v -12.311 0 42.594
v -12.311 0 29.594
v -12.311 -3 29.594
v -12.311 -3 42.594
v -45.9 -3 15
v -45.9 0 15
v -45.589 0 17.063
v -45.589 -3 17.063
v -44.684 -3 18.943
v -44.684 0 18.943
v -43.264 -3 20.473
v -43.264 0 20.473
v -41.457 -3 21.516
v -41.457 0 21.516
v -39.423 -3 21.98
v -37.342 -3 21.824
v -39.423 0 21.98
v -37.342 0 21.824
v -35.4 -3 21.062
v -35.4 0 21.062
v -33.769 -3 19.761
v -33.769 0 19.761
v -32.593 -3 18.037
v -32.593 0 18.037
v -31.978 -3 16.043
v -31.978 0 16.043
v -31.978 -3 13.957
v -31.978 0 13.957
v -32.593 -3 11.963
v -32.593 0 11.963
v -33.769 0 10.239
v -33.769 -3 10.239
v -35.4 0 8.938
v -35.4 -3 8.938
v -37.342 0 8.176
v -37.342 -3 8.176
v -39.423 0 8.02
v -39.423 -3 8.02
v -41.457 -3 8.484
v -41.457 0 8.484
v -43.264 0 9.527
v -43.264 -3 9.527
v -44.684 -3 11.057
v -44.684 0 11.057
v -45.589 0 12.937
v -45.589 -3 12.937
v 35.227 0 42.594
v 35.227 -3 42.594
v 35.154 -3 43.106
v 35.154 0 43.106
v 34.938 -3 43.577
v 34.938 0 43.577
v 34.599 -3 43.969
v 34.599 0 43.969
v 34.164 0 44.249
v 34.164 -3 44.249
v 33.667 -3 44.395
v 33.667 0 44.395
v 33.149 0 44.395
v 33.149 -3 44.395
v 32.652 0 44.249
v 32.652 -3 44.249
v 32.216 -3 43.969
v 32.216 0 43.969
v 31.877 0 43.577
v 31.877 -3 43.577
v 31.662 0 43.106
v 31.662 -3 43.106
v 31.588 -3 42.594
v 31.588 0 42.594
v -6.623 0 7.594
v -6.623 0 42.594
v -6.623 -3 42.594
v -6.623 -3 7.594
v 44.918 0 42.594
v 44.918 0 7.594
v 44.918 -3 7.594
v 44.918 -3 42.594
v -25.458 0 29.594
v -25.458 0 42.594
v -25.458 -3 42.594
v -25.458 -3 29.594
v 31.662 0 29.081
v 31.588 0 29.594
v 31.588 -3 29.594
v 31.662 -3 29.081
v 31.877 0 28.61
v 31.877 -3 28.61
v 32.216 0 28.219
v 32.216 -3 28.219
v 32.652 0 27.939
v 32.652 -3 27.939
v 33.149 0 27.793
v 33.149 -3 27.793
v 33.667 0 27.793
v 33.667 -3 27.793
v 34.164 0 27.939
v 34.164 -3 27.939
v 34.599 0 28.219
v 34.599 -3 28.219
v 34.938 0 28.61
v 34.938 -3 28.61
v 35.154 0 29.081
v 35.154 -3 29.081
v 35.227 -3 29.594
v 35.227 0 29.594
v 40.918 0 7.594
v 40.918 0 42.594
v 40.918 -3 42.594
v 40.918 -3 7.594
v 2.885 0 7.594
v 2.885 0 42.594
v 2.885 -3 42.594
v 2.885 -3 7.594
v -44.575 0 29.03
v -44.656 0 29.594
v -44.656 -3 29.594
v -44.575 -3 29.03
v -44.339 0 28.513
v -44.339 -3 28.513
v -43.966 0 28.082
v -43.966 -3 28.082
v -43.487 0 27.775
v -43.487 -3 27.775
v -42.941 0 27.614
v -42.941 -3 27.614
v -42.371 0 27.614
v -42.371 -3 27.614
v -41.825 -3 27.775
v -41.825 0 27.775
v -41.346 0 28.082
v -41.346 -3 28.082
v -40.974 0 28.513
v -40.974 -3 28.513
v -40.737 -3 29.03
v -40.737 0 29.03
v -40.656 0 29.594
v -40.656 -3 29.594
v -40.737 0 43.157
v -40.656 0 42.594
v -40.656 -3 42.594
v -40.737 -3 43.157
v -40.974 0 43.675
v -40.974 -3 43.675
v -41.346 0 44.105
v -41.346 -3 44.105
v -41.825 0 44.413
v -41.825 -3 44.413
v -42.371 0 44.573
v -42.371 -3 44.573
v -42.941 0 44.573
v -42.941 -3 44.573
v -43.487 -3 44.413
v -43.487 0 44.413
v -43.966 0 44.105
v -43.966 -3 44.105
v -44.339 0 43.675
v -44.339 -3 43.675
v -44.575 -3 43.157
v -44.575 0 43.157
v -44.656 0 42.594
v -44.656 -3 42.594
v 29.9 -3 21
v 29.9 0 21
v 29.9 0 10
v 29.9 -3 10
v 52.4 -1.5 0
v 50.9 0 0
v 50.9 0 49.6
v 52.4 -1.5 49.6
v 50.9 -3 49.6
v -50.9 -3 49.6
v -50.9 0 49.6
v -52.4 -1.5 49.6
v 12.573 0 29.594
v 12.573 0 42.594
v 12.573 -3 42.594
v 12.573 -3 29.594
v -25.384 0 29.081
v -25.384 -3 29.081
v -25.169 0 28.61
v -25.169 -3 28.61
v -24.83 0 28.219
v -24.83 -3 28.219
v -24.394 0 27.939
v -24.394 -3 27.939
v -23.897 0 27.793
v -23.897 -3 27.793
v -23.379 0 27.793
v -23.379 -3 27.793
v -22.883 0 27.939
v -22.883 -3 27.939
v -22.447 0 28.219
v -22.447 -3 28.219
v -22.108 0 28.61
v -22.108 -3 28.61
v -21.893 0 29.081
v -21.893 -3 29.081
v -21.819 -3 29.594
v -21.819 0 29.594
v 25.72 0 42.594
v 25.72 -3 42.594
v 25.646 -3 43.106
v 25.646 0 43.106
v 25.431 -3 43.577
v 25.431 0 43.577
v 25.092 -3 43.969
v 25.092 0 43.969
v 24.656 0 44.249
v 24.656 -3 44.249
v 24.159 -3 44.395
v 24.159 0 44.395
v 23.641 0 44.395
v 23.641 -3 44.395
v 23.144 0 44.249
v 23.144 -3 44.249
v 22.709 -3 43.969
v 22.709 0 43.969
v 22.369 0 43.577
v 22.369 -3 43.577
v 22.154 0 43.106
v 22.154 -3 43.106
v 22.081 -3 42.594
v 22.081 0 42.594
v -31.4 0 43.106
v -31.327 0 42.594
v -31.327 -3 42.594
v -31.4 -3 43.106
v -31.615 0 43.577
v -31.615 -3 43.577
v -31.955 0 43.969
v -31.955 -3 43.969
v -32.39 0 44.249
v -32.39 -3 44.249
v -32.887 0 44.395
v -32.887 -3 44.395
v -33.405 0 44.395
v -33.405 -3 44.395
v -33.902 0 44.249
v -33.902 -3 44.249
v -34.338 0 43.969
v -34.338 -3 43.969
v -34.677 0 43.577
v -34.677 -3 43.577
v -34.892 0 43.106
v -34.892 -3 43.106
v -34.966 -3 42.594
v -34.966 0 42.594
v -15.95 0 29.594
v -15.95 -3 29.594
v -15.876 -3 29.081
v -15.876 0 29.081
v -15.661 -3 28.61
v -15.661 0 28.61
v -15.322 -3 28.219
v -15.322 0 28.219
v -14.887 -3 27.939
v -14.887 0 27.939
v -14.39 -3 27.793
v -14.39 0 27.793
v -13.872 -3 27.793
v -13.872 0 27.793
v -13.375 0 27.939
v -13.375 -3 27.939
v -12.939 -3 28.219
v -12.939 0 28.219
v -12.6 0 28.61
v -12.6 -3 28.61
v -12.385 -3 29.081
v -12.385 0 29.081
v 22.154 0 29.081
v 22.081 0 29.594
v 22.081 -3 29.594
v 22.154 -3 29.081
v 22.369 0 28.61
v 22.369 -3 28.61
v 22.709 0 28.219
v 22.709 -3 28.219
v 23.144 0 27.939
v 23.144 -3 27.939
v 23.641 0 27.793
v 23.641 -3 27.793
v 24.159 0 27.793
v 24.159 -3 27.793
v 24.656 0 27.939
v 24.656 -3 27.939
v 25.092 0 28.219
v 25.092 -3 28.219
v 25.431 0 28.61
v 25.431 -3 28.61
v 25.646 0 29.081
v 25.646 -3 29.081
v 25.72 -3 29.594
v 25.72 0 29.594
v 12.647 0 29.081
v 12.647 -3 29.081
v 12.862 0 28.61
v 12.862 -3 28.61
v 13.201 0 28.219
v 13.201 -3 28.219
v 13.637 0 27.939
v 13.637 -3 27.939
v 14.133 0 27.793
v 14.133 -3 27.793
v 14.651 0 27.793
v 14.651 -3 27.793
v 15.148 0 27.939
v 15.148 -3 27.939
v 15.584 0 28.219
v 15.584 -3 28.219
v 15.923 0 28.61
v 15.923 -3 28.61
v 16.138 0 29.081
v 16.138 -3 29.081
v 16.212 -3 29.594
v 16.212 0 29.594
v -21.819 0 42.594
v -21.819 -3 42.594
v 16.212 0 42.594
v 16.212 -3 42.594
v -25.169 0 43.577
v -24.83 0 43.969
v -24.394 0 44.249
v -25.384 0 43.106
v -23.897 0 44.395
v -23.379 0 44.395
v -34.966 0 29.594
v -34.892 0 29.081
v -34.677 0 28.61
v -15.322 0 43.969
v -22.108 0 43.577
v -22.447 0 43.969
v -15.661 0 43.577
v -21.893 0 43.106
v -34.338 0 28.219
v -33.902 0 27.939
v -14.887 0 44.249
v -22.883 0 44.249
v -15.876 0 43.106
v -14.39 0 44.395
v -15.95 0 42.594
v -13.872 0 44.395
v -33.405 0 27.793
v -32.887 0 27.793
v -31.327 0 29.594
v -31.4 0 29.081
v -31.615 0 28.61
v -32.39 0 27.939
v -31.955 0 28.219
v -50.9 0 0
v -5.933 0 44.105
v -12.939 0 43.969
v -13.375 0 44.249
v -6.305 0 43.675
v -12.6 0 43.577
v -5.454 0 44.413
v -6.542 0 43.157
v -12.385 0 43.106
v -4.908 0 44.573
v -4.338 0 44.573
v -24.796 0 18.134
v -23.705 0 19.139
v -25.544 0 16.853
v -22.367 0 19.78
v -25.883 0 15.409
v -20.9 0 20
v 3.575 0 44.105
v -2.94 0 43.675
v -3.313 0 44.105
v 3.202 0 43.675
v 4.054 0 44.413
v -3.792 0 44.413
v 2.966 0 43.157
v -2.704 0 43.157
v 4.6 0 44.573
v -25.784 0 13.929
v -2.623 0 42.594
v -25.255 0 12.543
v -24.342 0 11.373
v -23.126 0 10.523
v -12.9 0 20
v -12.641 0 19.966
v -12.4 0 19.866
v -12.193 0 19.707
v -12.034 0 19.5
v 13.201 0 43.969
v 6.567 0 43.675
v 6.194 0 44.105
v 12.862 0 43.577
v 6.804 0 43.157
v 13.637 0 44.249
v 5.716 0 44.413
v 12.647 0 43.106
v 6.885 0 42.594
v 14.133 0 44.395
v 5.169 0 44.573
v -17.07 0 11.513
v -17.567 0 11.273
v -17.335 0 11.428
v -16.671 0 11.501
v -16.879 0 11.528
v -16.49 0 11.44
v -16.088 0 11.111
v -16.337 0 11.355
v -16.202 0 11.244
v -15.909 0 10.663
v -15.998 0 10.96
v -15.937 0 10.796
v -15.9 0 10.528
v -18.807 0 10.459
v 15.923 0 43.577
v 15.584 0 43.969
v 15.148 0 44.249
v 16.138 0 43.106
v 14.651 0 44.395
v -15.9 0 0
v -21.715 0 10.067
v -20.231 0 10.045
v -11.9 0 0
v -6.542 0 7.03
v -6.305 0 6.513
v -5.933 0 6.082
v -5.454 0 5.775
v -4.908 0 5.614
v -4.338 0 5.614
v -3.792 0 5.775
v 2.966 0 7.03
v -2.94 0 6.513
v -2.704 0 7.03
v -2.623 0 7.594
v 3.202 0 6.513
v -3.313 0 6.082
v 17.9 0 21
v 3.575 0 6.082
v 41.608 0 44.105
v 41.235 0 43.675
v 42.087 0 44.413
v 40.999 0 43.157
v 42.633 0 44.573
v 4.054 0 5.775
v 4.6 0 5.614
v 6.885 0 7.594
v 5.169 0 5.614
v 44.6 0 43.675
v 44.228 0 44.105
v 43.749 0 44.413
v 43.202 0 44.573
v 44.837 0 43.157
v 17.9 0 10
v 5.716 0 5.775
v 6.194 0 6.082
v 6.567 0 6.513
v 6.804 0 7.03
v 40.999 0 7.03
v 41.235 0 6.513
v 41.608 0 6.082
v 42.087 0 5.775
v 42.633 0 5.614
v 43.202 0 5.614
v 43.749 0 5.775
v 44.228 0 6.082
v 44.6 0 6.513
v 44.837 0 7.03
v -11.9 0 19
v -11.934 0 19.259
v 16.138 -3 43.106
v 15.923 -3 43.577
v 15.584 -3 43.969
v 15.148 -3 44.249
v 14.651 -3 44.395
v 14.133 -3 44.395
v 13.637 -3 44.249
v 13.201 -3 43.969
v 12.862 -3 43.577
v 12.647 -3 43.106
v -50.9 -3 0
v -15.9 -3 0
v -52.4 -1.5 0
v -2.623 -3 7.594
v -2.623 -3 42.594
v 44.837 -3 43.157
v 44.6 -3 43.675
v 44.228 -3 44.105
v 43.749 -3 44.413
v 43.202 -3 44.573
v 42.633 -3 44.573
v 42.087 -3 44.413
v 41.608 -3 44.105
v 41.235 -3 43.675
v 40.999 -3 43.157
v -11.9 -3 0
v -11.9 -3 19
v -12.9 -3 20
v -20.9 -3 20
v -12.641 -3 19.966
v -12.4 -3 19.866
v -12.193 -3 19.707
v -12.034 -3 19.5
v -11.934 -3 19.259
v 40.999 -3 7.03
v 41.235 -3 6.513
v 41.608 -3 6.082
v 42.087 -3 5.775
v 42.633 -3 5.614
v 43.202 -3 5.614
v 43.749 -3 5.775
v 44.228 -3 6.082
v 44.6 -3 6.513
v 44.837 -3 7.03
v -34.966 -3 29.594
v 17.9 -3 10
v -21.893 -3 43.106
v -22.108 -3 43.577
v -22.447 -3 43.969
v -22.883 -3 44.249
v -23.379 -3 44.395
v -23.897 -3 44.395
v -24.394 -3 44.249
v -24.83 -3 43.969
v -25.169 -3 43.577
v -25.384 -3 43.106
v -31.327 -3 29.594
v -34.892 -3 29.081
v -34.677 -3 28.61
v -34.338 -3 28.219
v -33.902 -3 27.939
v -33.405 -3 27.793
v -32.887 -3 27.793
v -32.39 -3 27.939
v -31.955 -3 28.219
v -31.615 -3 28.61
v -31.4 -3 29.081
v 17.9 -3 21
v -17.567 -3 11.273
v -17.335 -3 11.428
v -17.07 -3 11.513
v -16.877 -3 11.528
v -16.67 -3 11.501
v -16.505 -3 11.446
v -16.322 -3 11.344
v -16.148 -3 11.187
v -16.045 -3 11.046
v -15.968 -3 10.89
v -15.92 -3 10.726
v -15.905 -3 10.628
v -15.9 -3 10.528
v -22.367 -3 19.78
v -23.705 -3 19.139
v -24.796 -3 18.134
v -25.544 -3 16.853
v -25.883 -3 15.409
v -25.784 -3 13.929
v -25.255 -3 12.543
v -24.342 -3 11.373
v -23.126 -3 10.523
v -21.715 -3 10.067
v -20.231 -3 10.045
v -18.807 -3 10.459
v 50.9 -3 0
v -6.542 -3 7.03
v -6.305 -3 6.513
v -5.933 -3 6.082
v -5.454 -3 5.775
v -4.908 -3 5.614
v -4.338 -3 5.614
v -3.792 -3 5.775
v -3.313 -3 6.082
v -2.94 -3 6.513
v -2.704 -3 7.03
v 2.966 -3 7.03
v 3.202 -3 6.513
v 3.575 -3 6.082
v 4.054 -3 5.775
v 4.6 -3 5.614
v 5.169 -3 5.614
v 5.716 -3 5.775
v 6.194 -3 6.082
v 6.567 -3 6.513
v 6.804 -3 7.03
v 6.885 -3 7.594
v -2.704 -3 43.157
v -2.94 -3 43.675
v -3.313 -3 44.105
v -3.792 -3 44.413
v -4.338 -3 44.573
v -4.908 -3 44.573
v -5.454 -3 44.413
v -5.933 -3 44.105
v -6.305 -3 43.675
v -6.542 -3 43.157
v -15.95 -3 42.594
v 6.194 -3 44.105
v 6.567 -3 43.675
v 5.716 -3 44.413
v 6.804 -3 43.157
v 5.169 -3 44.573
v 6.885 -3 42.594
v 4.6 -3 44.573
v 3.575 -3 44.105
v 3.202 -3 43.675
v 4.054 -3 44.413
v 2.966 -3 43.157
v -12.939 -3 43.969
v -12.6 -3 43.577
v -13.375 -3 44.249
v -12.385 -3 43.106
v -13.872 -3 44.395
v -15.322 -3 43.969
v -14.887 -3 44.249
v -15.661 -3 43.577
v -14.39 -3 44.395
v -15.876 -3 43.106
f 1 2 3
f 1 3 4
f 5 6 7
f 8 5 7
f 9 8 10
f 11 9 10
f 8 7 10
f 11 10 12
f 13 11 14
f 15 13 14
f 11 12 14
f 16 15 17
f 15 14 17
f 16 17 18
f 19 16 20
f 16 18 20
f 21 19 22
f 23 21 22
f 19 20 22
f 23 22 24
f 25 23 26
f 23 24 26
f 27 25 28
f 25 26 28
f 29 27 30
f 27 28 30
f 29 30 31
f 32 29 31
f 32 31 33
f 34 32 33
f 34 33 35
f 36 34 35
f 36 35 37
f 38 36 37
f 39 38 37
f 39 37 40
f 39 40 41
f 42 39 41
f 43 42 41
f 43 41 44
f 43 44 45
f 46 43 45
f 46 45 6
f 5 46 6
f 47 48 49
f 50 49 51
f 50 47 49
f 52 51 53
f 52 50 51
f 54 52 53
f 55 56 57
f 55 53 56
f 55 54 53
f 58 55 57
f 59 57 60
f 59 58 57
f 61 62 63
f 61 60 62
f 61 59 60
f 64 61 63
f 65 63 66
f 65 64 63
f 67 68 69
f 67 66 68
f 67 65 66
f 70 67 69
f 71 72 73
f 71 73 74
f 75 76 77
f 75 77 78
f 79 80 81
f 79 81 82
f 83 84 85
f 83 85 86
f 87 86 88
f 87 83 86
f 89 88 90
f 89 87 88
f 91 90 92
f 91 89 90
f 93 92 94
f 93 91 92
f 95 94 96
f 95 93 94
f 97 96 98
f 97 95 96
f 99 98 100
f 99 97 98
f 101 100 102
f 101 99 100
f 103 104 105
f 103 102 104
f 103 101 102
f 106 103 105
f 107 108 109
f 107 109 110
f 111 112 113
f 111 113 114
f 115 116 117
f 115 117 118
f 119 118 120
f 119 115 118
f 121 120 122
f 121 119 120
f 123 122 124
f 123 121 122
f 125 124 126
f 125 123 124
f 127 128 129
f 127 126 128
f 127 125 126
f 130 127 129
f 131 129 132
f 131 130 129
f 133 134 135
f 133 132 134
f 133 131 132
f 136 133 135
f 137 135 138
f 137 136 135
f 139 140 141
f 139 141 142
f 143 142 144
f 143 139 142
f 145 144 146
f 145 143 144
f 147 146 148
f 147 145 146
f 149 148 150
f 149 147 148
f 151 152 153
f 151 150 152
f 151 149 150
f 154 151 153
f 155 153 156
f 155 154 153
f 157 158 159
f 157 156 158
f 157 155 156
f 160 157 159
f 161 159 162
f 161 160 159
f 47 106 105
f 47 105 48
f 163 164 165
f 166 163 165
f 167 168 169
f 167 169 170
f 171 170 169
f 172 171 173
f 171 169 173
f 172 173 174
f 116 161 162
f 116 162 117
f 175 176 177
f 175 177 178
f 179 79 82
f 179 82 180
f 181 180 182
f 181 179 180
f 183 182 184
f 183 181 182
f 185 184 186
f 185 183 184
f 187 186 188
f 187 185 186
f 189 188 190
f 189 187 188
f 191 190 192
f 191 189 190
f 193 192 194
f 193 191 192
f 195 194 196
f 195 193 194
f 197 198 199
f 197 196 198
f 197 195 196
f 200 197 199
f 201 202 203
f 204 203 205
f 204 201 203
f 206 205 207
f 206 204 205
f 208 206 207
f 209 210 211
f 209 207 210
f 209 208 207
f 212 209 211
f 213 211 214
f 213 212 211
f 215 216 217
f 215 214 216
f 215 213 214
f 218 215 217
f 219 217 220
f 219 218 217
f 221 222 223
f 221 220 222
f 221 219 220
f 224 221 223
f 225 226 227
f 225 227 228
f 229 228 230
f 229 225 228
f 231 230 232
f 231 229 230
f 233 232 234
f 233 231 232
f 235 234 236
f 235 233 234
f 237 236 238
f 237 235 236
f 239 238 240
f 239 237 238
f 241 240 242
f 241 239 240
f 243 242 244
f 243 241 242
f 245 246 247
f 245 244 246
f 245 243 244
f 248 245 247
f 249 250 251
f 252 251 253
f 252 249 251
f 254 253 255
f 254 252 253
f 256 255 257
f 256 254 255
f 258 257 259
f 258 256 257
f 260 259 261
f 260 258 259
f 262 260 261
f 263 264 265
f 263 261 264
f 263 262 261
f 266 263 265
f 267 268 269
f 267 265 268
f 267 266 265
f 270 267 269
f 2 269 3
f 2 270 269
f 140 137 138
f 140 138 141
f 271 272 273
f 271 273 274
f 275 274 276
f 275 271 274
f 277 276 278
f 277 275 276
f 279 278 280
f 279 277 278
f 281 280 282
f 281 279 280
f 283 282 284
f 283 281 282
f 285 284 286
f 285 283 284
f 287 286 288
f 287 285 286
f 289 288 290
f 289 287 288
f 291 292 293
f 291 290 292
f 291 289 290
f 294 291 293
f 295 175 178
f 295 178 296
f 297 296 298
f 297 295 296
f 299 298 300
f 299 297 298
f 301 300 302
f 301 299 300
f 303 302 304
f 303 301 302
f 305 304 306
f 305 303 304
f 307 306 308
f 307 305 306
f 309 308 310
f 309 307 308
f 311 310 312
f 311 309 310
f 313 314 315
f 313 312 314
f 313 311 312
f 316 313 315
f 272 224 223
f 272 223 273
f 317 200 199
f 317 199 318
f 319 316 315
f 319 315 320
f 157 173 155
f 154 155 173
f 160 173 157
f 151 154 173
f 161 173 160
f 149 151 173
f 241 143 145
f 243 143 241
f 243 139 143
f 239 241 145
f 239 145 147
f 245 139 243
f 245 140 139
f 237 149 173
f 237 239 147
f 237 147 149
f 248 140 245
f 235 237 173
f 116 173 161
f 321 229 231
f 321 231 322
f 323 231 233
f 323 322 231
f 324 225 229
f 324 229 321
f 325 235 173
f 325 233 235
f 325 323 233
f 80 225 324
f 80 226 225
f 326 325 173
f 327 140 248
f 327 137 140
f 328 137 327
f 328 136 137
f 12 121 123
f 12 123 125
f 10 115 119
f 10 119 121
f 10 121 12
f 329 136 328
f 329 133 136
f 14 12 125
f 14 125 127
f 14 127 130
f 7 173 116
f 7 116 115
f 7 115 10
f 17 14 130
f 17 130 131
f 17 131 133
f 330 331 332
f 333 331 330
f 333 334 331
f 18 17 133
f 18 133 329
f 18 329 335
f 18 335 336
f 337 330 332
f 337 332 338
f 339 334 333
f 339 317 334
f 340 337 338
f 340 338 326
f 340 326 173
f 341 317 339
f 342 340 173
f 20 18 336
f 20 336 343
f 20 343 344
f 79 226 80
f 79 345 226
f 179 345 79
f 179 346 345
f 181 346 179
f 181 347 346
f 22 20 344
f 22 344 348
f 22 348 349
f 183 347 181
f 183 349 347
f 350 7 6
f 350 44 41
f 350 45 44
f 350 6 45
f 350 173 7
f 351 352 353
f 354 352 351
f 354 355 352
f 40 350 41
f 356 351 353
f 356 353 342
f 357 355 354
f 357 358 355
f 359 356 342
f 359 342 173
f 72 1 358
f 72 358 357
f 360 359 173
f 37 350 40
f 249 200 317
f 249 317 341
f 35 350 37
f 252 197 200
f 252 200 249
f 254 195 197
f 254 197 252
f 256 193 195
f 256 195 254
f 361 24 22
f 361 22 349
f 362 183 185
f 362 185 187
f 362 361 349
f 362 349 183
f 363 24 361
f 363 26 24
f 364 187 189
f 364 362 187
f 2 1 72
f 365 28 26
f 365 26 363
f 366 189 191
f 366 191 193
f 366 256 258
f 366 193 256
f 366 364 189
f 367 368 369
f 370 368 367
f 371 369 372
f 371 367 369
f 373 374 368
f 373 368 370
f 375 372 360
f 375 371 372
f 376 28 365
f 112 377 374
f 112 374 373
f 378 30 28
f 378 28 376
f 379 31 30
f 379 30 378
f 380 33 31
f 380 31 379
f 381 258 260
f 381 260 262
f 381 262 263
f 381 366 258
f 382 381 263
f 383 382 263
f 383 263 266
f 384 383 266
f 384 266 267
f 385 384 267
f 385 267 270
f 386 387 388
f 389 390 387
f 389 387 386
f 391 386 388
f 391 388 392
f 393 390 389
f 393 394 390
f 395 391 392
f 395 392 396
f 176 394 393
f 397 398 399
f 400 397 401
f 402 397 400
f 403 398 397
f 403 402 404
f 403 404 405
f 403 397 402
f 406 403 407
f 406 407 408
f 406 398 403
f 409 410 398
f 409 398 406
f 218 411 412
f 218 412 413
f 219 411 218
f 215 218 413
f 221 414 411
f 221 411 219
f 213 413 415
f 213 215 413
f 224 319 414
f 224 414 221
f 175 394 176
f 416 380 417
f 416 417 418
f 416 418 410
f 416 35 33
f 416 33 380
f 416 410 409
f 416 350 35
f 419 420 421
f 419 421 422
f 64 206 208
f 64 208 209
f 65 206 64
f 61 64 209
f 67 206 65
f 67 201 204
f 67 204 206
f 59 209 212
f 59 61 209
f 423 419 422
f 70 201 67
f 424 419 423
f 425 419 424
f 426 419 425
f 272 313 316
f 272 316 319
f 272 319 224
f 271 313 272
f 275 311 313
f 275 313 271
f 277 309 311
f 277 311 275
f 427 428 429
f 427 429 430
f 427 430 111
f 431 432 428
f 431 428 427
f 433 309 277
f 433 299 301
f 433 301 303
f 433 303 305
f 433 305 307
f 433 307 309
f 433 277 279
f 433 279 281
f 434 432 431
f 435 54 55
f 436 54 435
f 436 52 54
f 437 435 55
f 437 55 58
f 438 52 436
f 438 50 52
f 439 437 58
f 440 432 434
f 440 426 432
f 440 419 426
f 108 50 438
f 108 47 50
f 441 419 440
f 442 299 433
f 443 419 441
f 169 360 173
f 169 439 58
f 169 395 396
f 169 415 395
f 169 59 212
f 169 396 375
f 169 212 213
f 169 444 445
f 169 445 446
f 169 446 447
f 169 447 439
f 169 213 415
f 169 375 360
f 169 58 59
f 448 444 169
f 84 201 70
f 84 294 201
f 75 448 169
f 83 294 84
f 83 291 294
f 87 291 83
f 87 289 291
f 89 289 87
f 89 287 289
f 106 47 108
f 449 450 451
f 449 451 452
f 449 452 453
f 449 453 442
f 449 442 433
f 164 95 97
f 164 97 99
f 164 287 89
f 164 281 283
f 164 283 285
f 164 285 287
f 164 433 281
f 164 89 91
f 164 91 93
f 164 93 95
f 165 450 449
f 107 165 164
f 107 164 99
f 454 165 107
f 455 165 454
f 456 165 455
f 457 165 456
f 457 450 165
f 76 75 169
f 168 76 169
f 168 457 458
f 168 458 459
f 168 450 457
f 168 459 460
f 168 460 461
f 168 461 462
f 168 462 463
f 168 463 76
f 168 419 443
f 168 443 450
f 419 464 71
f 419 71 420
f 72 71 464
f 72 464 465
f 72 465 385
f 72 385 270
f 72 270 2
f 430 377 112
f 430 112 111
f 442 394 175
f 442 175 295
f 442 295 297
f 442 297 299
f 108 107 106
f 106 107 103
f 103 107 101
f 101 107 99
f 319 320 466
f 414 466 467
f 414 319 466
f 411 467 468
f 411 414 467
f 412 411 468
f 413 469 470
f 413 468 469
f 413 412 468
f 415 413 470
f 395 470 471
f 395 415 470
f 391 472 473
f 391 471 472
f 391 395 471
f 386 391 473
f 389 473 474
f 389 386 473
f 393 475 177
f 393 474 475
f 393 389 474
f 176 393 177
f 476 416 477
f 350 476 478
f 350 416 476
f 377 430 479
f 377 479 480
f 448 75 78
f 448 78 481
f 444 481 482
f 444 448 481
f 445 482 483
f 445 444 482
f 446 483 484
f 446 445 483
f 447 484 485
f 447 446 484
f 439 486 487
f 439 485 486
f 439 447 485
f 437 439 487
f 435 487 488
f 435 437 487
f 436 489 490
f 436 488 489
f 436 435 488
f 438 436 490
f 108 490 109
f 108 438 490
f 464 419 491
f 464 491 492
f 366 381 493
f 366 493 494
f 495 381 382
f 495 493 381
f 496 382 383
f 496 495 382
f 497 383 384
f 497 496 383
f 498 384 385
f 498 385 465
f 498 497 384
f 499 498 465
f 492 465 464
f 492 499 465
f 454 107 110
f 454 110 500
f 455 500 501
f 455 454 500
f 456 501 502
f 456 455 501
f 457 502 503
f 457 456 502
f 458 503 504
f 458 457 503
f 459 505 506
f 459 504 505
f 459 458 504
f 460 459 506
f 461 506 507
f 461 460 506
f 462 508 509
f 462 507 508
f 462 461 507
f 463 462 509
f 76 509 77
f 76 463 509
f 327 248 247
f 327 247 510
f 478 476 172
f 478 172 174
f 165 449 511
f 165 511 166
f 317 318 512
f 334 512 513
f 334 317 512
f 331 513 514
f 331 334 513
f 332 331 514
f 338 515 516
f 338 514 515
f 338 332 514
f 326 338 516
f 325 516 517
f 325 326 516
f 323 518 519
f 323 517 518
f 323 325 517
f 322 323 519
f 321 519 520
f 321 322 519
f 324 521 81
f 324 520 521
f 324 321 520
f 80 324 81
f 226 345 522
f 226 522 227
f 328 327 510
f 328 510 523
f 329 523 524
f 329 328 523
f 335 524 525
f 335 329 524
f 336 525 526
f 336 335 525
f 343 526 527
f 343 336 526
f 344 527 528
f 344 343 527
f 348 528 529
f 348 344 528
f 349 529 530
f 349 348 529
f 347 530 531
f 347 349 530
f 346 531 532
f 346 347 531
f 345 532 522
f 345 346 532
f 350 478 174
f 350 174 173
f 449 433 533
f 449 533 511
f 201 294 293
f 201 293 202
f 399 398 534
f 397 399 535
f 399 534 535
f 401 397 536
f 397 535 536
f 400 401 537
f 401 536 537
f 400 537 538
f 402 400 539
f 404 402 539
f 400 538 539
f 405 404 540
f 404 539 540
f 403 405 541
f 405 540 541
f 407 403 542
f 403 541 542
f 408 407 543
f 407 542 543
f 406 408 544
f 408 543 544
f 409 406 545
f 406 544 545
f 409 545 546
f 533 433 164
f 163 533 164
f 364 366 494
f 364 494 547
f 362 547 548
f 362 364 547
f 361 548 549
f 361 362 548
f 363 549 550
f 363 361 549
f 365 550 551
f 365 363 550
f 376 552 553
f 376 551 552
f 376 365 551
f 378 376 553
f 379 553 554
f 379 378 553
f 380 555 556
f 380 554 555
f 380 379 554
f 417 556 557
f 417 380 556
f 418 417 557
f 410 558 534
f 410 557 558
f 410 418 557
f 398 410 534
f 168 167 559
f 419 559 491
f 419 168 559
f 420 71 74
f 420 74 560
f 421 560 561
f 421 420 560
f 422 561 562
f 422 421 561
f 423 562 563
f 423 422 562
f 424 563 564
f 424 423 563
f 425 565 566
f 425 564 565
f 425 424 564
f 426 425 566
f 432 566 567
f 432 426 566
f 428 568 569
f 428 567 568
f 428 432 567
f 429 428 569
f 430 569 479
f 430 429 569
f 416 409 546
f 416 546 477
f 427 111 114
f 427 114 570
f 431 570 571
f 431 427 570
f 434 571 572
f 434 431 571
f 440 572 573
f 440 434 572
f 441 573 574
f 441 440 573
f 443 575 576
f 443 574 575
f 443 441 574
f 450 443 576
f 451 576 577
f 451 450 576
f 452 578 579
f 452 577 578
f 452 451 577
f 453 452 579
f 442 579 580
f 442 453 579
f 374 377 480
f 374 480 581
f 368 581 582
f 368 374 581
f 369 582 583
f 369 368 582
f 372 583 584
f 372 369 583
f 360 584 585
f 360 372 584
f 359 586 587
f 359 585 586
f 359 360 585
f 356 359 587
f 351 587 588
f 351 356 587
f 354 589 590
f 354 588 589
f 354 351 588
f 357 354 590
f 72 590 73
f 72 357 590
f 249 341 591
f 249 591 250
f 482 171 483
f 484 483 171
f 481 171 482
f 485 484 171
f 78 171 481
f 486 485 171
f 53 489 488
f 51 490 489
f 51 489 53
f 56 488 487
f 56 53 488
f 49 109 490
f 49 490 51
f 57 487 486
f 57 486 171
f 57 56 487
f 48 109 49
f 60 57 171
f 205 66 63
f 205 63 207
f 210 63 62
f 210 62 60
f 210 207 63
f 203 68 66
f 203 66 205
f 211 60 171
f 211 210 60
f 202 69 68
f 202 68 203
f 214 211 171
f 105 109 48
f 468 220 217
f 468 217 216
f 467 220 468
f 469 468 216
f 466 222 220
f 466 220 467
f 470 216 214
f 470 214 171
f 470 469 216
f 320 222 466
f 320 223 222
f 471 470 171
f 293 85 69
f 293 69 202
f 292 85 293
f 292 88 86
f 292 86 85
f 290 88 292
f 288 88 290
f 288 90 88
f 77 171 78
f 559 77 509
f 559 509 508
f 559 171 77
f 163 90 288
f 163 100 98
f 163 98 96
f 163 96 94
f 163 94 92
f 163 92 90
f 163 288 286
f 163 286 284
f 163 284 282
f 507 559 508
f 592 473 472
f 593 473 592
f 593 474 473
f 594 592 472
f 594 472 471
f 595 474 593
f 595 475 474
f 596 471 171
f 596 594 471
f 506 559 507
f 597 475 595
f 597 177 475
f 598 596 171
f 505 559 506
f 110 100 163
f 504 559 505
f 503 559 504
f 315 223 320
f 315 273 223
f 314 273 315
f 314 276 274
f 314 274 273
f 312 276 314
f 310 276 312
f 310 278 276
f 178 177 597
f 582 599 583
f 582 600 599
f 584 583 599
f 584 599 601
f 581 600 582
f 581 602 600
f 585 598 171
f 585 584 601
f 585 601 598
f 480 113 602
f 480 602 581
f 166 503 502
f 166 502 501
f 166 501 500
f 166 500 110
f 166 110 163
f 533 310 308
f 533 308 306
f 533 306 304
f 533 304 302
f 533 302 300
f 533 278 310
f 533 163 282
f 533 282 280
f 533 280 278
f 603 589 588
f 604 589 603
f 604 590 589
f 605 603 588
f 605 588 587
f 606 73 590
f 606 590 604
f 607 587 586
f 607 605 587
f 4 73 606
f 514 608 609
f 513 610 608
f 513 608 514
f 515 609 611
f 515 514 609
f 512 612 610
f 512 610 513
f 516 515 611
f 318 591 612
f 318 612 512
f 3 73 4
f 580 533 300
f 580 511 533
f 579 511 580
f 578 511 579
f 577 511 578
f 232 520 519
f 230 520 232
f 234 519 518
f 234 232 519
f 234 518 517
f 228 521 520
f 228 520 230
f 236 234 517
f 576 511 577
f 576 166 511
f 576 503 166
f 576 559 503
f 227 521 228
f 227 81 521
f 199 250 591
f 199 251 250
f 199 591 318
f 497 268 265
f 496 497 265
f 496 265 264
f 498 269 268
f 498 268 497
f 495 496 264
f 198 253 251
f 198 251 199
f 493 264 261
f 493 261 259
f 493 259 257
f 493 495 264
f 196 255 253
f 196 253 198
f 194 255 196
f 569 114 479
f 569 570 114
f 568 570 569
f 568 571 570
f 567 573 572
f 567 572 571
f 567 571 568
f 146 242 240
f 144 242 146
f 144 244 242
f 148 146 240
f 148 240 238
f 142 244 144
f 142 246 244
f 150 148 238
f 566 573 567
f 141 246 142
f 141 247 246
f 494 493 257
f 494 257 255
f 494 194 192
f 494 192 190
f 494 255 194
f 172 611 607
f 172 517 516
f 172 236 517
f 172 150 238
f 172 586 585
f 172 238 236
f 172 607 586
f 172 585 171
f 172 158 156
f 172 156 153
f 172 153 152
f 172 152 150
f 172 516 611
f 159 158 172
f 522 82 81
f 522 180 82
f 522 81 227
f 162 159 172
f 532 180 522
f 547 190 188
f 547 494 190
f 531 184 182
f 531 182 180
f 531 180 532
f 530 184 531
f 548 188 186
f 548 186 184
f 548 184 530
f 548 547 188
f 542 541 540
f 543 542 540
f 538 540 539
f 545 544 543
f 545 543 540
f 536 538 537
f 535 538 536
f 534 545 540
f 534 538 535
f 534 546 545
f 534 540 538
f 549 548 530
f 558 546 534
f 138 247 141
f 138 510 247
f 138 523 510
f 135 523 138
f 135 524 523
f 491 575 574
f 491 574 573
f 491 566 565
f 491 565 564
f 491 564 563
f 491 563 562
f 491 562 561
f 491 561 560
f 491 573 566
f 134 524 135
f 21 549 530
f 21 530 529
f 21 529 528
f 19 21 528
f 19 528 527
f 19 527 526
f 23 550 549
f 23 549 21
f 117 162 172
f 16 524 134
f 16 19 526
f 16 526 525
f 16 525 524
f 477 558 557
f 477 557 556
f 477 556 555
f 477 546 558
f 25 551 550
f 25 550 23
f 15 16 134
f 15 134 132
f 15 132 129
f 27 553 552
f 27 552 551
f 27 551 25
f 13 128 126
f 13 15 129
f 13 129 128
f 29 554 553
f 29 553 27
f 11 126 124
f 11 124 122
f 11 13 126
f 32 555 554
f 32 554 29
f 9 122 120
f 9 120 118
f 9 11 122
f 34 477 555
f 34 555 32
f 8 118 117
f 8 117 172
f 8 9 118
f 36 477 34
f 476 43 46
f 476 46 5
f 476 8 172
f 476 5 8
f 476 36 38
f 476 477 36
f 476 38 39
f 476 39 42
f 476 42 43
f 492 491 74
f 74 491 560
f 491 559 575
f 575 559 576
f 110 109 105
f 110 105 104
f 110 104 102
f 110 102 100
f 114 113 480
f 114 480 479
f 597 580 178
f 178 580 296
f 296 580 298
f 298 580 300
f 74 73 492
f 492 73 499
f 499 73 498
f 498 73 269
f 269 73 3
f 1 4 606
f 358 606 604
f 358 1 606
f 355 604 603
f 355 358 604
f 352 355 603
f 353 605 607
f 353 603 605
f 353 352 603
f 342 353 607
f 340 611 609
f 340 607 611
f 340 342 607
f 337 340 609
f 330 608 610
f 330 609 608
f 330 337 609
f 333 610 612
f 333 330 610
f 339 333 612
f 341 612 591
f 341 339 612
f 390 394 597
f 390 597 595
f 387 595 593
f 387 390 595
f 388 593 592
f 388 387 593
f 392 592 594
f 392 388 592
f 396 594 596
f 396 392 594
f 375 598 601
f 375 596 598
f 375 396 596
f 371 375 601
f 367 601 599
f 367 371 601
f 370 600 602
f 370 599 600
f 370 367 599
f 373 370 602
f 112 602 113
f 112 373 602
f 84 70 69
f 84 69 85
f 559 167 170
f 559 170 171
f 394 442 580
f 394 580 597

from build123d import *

# Parameters (mm, degrees)
BOSS_EXTRUDE1_DEPTH = 49.6
CUT_EXTRUDE1_REACH  = 74.214
SKETCH5_R           = 7
SKETCH5_W           = 12
SKETCH5_H           = 11
FILLET1_R           = 1


with BuildPart() as part:
    # Sketch4 → Boss-Extrude1 (new body)
    with BuildSketch(Plane.XY):
        Polygon((-50.9, 0), (50.9, 0), (52.4, -1.5), (50.9, -3), (-50.9, -3), (-52.4, -1.5), align=None)
    extrude(amount=BOSS_EXTRUDE1_DEPTH)

    # Sketch5 → Cut-Extrude1 (cut, up to next)
    with BuildSketch(Plane(origin=(0, 0, 0), x_dir=(1, 0, 0), z_dir=(0, 1, 0)), mode=Mode.PRIVATE) as cut_extrude1_sk1:
        with Locations((-38.9, -15)):
            Circle(SKETCH5_R)
    cut_extrude1_tool1 = extrude(cut_extrude1_sk1.sketch, amount=-CUT_EXTRUDE1_REACH, mode=Mode.PRIVATE) & part.part
    # Sketch5 → Cut-Extrude1 (cut, up to next)
    with BuildSketch(Plane(origin=(0, 0, 0), x_dir=(1, 0, 0), z_dir=(0, 1, 0)), mode=Mode.PRIVATE) as cut_extrude1_sk2:
        with Locations((23.9, -15.5)):
            Rectangle(SKETCH5_W, SKETCH5_H)
    cut_extrude1_tool2 = extrude(cut_extrude1_sk2.sketch, amount=-CUT_EXTRUDE1_REACH, mode=Mode.PRIVATE) & part.part
    # Sketch5 → Cut-Extrude1 (cut, up to next)
    with BuildSketch(Plane(origin=(0, 0, 0), x_dir=(1, 0, 0), z_dir=(0, 1, 0)), mode=Mode.PRIVATE) as cut_extrude1_sk3:
        with BuildLine():
            Line((-15.9, -15), (-15.9, 0))
            Line((-15.9, 0), (-11.9, 0))
            Line((-11.9, 0), (-11.9, -20))
            Line((-11.9, -20), (-20.9, -20))
            ThreePointArc((-20.9, -20), (-24.435533906, -11.464466094), (-15.9, -15))
        make_face()
    cut_extrude1_tool3 = extrude(cut_extrude1_sk3.sketch, amount=-CUT_EXTRUDE1_REACH, mode=Mode.PRIVATE) & part.part
    # Sketch5 → Cut-Extrude1 (cut, up to next)
    with BuildSketch(Plane(origin=(0, 0, 0), x_dir=(1, 0, 0), z_dir=(0, 1, 0)), mode=Mode.PRIVATE) as cut_extrude1_sk4:
        with BuildLine():
            Line((-44.656064428, -42.593823795), (-44.656064428, -29.593823795))
            ThreePointArc((-44.656064428, -29.593823795), (-42.656064428, -27.593823795), (-40.656064428, -29.593823795))
            Line((-40.656064428, -29.593823795), (-40.656064428, -42.593823795))
            ThreePointArc((-40.656064428, -42.593823795), (-42.656064428, -44.593823795), (-44.656064428, -42.593823795))
        make_face()
    cut_extrude1_tool4 = extrude(cut_extrude1_sk4.sketch, amount=-CUT_EXTRUDE1_REACH, mode=Mode.PRIVATE) & part.part
    # Sketch5 → Cut-Extrude1 (cut, up to next)
    with BuildSketch(Plane(origin=(0, 0, 0), x_dir=(1, 0, 0), z_dir=(0, 1, 0)), mode=Mode.PRIVATE) as cut_extrude1_sk5:
        with BuildLine():
            Line((40.917781725, -42.593823795), (40.917781725, -7.593823795))
            ThreePointArc((40.917781725, -7.593823795), (42.917781725, -5.593823795), (44.917781725, -7.593823795))
            Line((44.917781725, -7.593823795), (44.917781725, -42.593823795))
            ThreePointArc((44.917781725, -42.593823795), (42.917781725, -44.593823795), (40.917781725, -42.593823795))
        make_face()
    cut_extrude1_tool5 = extrude(cut_extrude1_sk5.sketch, amount=-CUT_EXTRUDE1_REACH, mode=Mode.PRIVATE) & part.part
    # Sketch5 → Cut-Extrude1 (cut, up to next)
    with BuildSketch(Plane(origin=(0, 0, 0), x_dir=(1, 0, 0), z_dir=(0, 1, 0)), mode=Mode.PRIVATE) as cut_extrude1_sk6:
        with BuildLine():
            Line((-34.965522839, -42.593823795), (-34.965522839, -29.593823795))
            ThreePointArc((-34.965522839, -29.593823795), (-33.146064428, -27.774365385), (-31.326606018, -29.593823795))
            Line((-31.326606018, -29.593823795), (-31.326606018, -42.593823795))
            ThreePointArc((-31.326606018, -42.593823795), (-33.146064428, -44.413282206), (-34.965522839, -42.593823795))
        make_face()
    cut_extrude1_tool6 = extrude(cut_extrude1_sk6.sketch, amount=-CUT_EXTRUDE1_REACH, mode=Mode.PRIVATE) & part.part
    # Sketch5 → Cut-Extrude1 (cut, up to next)
    with BuildSketch(Plane(origin=(0, 0, 0), x_dir=(1, 0, 0), z_dir=(0, 1, 0)), mode=Mode.PRIVATE) as cut_extrude1_sk7:
        with BuildLine():
            Line((-25.457830531, -42.593823795), (-25.457830531, -29.593823795))
            ThreePointArc((-25.457830531, -29.593823795), (-23.638372121, -27.774365385), (-21.81891371, -29.593823795))
            Line((-21.81891371, -29.593823795), (-21.81891371, -42.593823795))
            ThreePointArc((-21.81891371, -42.593823795), (-23.638372121, -44.413282206), (-25.457830531, -42.593823795))
        make_face()
    cut_extrude1_tool7 = extrude(cut_extrude1_sk7.sketch, amount=-CUT_EXTRUDE1_REACH, mode=Mode.PRIVATE) & part.part
    # Sketch5 → Cut-Extrude1 (cut, up to next)
    with BuildSketch(Plane(origin=(0, 0, 0), x_dir=(1, 0, 0), z_dir=(0, 1, 0)), mode=Mode.PRIVATE) as cut_extrude1_sk8:
        with BuildLine():
            Line((-15.950138223, -42.593823795), (-15.950138223, -29.593823795))
            ThreePointArc((-15.950138223, -29.593823795), (-14.130679813, -27.774365385), (-12.311221403, -29.593823795))
            Line((-12.311221403, -29.593823795), (-12.311221403, -42.593823795))
            ThreePointArc((-12.311221403, -42.593823795), (-14.130679813, -44.413282206), (-15.950138223, -42.593823795))
        make_face()
    cut_extrude1_tool8 = extrude(cut_extrude1_sk8.sketch, amount=-CUT_EXTRUDE1_REACH, mode=Mode.PRIVATE) & part.part
    # Sketch5 → Cut-Extrude1 (cut, up to next)
    with BuildSketch(Plane(origin=(0, 0, 0), x_dir=(1, 0, 0), z_dir=(0, 1, 0)), mode=Mode.PRIVATE) as cut_extrude1_sk9:
        with BuildLine():
            Line((-6.622987505, -42.593823795), (-6.622987505, -7.593823795))
            ThreePointArc((-6.622987505, -7.593823795), (-4.622987505, -5.593823795), (-2.622987505, -7.593823795))
            Line((-2.622987505, -7.593823795), (-2.622987505, -42.593823795))
            ThreePointArc((-2.622987505, -42.593823795), (-4.622987505, -44.593823795), (-6.622987505, -42.593823795))
        make_face()
    cut_extrude1_tool9 = extrude(cut_extrude1_sk9.sketch, amount=-CUT_EXTRUDE1_REACH, mode=Mode.PRIVATE) & part.part
    # Sketch5 → Cut-Extrude1 (cut, up to next)
    with BuildSketch(Plane(origin=(0, 0, 0), x_dir=(1, 0, 0), z_dir=(0, 1, 0)), mode=Mode.PRIVATE) as cut_extrude1_sk10:
        with BuildLine():
            Line((2.884704802, -42.593823795), (2.884704802, -7.593823795))
            ThreePointArc((2.884704802, -7.593823795), (4.884704802, -5.593823795), (6.884704802, -7.593823795))
            Line((6.884704802, -7.593823795), (6.884704802, -42.593823795))
            ThreePointArc((6.884704802, -42.593823795), (4.884704802, -44.593823795), (2.884704802, -42.593823795))
        make_face()
    cut_extrude1_tool10 = extrude(cut_extrude1_sk10.sketch, amount=-CUT_EXTRUDE1_REACH, mode=Mode.PRIVATE) & part.part
    # Sketch5 → Cut-Extrude1 (cut, up to next)
    with BuildSketch(Plane(origin=(0, 0, 0), x_dir=(1, 0, 0), z_dir=(0, 1, 0)), mode=Mode.PRIVATE) as cut_extrude1_sk11:
        with BuildLine():
            Line((12.5729387, -42.593823795), (12.5729387, -29.593823795))
            ThreePointArc((12.5729387, -29.593823795), (14.39239711, -27.774365385), (16.211855521, -29.593823795))
            Line((16.211855521, -29.593823795), (16.211855521, -42.593823795))
            ThreePointArc((16.211855521, -42.593823795), (14.39239711, -44.413282206), (12.5729387, -42.593823795))
        make_face()
    cut_extrude1_tool11 = extrude(cut_extrude1_sk11.sketch, amount=-CUT_EXTRUDE1_REACH, mode=Mode.PRIVATE) & part.part
    # Sketch5 → Cut-Extrude1 (cut, up to next)
    with BuildSketch(Plane(origin=(0, 0, 0), x_dir=(1, 0, 0), z_dir=(0, 1, 0)), mode=Mode.PRIVATE) as cut_extrude1_sk12:
        with BuildLine():
            Line((22.080631007, -42.593823795), (22.080631007, -29.593823795))
            ThreePointArc((22.080631007, -29.593823795), (23.900089418, -27.774365385), (25.719547828, -29.593823795))
            Line((25.719547828, -29.593823795), (25.719547828, -42.593823795))
            ThreePointArc((25.719547828, -42.593823795), (23.900089418, -44.413282206), (22.080631007, -42.593823795))
        make_face()
    cut_extrude1_tool12 = extrude(cut_extrude1_sk12.sketch, amount=-CUT_EXTRUDE1_REACH, mode=Mode.PRIVATE) & part.part
    # Sketch5 → Cut-Extrude1 (cut, up to next)
    with BuildSketch(Plane(origin=(0, 0, 0), x_dir=(1, 0, 0), z_dir=(0, 1, 0)), mode=Mode.PRIVATE) as cut_extrude1_sk13:
        with BuildLine():
            Line((31.588323315, -42.593823795), (31.588323315, -29.593823795))
            ThreePointArc((31.588323315, -29.593823795), (33.407781725, -27.774365385), (35.227240136, -29.593823795))
            Line((35.227240136, -29.593823795), (35.227240136, -42.593823795))
            ThreePointArc((35.227240136, -42.593823795), (33.407781725, -44.413282206), (31.588323315, -42.593823795))
        make_face()
    cut_extrude1_tool13 = extrude(cut_extrude1_sk13.sketch, amount=-CUT_EXTRUDE1_REACH, mode=Mode.PRIVATE) & part.part
    add(cut_extrude1_tool1.solids().sort_by_distance((-38.9, 0, 15))[0], mode=Mode.SUBTRACT)
    add(cut_extrude1_tool2.solids().sort_by_distance((23.9, 0, 15.5))[0], mode=Mode.SUBTRACT)
    add(cut_extrude1_tool3.solids().sort_by_distance((-17.356278, 0, 12.686666))[0], mode=Mode.SUBTRACT)
    add(cut_extrude1_tool4.solids().sort_by_distance((-42.656064, 0, 36.093824))[0], mode=Mode.SUBTRACT)
    add(cut_extrude1_tool5.solids().sort_by_distance((42.917782, 0, 25.093824))[0], mode=Mode.SUBTRACT)
    add(cut_extrude1_tool6.solids().sort_by_distance((-33.146064, 0, 36.093824))[0], mode=Mode.SUBTRACT)
    add(cut_extrude1_tool7.solids().sort_by_distance((-23.638372, 0, 36.093824))[0], mode=Mode.SUBTRACT)
    add(cut_extrude1_tool8.solids().sort_by_distance((-14.13068, 0, 36.093824))[0], mode=Mode.SUBTRACT)
    add(cut_extrude1_tool9.solids().sort_by_distance((-4.622988, 0, 25.093824))[0], mode=Mode.SUBTRACT)
    add(cut_extrude1_tool10.solids().sort_by_distance((4.884705, 0, 25.093824))[0], mode=Mode.SUBTRACT)
    add(cut_extrude1_tool11.solids().sort_by_distance((14.392397, 0, 36.093824))[0], mode=Mode.SUBTRACT)
    add(cut_extrude1_tool12.solids().sort_by_distance((23.900089, 0, 36.093824))[0], mode=Mode.SUBTRACT)
    add(cut_extrude1_tool13.solids().sort_by_distance((33.407782, 0, 36.093824))[0], mode=Mode.SUBTRACT)

    # Fillet1
    fillet1_edges = [part.edges().sort_by_distance(p)[0] for p in [
        (-11.9, -1.5, 20),
    ]]
    fillet(fillet1_edges, radius=FILLET1_R)
    fillet1_2_edges = [part.edges().sort_by_distance(p)[0] for p in [
        (-15.9, -1.5, 15),
    ]]
    fillet(fillet1_2_edges, radius=FILLET1_R)


solid = part.part
